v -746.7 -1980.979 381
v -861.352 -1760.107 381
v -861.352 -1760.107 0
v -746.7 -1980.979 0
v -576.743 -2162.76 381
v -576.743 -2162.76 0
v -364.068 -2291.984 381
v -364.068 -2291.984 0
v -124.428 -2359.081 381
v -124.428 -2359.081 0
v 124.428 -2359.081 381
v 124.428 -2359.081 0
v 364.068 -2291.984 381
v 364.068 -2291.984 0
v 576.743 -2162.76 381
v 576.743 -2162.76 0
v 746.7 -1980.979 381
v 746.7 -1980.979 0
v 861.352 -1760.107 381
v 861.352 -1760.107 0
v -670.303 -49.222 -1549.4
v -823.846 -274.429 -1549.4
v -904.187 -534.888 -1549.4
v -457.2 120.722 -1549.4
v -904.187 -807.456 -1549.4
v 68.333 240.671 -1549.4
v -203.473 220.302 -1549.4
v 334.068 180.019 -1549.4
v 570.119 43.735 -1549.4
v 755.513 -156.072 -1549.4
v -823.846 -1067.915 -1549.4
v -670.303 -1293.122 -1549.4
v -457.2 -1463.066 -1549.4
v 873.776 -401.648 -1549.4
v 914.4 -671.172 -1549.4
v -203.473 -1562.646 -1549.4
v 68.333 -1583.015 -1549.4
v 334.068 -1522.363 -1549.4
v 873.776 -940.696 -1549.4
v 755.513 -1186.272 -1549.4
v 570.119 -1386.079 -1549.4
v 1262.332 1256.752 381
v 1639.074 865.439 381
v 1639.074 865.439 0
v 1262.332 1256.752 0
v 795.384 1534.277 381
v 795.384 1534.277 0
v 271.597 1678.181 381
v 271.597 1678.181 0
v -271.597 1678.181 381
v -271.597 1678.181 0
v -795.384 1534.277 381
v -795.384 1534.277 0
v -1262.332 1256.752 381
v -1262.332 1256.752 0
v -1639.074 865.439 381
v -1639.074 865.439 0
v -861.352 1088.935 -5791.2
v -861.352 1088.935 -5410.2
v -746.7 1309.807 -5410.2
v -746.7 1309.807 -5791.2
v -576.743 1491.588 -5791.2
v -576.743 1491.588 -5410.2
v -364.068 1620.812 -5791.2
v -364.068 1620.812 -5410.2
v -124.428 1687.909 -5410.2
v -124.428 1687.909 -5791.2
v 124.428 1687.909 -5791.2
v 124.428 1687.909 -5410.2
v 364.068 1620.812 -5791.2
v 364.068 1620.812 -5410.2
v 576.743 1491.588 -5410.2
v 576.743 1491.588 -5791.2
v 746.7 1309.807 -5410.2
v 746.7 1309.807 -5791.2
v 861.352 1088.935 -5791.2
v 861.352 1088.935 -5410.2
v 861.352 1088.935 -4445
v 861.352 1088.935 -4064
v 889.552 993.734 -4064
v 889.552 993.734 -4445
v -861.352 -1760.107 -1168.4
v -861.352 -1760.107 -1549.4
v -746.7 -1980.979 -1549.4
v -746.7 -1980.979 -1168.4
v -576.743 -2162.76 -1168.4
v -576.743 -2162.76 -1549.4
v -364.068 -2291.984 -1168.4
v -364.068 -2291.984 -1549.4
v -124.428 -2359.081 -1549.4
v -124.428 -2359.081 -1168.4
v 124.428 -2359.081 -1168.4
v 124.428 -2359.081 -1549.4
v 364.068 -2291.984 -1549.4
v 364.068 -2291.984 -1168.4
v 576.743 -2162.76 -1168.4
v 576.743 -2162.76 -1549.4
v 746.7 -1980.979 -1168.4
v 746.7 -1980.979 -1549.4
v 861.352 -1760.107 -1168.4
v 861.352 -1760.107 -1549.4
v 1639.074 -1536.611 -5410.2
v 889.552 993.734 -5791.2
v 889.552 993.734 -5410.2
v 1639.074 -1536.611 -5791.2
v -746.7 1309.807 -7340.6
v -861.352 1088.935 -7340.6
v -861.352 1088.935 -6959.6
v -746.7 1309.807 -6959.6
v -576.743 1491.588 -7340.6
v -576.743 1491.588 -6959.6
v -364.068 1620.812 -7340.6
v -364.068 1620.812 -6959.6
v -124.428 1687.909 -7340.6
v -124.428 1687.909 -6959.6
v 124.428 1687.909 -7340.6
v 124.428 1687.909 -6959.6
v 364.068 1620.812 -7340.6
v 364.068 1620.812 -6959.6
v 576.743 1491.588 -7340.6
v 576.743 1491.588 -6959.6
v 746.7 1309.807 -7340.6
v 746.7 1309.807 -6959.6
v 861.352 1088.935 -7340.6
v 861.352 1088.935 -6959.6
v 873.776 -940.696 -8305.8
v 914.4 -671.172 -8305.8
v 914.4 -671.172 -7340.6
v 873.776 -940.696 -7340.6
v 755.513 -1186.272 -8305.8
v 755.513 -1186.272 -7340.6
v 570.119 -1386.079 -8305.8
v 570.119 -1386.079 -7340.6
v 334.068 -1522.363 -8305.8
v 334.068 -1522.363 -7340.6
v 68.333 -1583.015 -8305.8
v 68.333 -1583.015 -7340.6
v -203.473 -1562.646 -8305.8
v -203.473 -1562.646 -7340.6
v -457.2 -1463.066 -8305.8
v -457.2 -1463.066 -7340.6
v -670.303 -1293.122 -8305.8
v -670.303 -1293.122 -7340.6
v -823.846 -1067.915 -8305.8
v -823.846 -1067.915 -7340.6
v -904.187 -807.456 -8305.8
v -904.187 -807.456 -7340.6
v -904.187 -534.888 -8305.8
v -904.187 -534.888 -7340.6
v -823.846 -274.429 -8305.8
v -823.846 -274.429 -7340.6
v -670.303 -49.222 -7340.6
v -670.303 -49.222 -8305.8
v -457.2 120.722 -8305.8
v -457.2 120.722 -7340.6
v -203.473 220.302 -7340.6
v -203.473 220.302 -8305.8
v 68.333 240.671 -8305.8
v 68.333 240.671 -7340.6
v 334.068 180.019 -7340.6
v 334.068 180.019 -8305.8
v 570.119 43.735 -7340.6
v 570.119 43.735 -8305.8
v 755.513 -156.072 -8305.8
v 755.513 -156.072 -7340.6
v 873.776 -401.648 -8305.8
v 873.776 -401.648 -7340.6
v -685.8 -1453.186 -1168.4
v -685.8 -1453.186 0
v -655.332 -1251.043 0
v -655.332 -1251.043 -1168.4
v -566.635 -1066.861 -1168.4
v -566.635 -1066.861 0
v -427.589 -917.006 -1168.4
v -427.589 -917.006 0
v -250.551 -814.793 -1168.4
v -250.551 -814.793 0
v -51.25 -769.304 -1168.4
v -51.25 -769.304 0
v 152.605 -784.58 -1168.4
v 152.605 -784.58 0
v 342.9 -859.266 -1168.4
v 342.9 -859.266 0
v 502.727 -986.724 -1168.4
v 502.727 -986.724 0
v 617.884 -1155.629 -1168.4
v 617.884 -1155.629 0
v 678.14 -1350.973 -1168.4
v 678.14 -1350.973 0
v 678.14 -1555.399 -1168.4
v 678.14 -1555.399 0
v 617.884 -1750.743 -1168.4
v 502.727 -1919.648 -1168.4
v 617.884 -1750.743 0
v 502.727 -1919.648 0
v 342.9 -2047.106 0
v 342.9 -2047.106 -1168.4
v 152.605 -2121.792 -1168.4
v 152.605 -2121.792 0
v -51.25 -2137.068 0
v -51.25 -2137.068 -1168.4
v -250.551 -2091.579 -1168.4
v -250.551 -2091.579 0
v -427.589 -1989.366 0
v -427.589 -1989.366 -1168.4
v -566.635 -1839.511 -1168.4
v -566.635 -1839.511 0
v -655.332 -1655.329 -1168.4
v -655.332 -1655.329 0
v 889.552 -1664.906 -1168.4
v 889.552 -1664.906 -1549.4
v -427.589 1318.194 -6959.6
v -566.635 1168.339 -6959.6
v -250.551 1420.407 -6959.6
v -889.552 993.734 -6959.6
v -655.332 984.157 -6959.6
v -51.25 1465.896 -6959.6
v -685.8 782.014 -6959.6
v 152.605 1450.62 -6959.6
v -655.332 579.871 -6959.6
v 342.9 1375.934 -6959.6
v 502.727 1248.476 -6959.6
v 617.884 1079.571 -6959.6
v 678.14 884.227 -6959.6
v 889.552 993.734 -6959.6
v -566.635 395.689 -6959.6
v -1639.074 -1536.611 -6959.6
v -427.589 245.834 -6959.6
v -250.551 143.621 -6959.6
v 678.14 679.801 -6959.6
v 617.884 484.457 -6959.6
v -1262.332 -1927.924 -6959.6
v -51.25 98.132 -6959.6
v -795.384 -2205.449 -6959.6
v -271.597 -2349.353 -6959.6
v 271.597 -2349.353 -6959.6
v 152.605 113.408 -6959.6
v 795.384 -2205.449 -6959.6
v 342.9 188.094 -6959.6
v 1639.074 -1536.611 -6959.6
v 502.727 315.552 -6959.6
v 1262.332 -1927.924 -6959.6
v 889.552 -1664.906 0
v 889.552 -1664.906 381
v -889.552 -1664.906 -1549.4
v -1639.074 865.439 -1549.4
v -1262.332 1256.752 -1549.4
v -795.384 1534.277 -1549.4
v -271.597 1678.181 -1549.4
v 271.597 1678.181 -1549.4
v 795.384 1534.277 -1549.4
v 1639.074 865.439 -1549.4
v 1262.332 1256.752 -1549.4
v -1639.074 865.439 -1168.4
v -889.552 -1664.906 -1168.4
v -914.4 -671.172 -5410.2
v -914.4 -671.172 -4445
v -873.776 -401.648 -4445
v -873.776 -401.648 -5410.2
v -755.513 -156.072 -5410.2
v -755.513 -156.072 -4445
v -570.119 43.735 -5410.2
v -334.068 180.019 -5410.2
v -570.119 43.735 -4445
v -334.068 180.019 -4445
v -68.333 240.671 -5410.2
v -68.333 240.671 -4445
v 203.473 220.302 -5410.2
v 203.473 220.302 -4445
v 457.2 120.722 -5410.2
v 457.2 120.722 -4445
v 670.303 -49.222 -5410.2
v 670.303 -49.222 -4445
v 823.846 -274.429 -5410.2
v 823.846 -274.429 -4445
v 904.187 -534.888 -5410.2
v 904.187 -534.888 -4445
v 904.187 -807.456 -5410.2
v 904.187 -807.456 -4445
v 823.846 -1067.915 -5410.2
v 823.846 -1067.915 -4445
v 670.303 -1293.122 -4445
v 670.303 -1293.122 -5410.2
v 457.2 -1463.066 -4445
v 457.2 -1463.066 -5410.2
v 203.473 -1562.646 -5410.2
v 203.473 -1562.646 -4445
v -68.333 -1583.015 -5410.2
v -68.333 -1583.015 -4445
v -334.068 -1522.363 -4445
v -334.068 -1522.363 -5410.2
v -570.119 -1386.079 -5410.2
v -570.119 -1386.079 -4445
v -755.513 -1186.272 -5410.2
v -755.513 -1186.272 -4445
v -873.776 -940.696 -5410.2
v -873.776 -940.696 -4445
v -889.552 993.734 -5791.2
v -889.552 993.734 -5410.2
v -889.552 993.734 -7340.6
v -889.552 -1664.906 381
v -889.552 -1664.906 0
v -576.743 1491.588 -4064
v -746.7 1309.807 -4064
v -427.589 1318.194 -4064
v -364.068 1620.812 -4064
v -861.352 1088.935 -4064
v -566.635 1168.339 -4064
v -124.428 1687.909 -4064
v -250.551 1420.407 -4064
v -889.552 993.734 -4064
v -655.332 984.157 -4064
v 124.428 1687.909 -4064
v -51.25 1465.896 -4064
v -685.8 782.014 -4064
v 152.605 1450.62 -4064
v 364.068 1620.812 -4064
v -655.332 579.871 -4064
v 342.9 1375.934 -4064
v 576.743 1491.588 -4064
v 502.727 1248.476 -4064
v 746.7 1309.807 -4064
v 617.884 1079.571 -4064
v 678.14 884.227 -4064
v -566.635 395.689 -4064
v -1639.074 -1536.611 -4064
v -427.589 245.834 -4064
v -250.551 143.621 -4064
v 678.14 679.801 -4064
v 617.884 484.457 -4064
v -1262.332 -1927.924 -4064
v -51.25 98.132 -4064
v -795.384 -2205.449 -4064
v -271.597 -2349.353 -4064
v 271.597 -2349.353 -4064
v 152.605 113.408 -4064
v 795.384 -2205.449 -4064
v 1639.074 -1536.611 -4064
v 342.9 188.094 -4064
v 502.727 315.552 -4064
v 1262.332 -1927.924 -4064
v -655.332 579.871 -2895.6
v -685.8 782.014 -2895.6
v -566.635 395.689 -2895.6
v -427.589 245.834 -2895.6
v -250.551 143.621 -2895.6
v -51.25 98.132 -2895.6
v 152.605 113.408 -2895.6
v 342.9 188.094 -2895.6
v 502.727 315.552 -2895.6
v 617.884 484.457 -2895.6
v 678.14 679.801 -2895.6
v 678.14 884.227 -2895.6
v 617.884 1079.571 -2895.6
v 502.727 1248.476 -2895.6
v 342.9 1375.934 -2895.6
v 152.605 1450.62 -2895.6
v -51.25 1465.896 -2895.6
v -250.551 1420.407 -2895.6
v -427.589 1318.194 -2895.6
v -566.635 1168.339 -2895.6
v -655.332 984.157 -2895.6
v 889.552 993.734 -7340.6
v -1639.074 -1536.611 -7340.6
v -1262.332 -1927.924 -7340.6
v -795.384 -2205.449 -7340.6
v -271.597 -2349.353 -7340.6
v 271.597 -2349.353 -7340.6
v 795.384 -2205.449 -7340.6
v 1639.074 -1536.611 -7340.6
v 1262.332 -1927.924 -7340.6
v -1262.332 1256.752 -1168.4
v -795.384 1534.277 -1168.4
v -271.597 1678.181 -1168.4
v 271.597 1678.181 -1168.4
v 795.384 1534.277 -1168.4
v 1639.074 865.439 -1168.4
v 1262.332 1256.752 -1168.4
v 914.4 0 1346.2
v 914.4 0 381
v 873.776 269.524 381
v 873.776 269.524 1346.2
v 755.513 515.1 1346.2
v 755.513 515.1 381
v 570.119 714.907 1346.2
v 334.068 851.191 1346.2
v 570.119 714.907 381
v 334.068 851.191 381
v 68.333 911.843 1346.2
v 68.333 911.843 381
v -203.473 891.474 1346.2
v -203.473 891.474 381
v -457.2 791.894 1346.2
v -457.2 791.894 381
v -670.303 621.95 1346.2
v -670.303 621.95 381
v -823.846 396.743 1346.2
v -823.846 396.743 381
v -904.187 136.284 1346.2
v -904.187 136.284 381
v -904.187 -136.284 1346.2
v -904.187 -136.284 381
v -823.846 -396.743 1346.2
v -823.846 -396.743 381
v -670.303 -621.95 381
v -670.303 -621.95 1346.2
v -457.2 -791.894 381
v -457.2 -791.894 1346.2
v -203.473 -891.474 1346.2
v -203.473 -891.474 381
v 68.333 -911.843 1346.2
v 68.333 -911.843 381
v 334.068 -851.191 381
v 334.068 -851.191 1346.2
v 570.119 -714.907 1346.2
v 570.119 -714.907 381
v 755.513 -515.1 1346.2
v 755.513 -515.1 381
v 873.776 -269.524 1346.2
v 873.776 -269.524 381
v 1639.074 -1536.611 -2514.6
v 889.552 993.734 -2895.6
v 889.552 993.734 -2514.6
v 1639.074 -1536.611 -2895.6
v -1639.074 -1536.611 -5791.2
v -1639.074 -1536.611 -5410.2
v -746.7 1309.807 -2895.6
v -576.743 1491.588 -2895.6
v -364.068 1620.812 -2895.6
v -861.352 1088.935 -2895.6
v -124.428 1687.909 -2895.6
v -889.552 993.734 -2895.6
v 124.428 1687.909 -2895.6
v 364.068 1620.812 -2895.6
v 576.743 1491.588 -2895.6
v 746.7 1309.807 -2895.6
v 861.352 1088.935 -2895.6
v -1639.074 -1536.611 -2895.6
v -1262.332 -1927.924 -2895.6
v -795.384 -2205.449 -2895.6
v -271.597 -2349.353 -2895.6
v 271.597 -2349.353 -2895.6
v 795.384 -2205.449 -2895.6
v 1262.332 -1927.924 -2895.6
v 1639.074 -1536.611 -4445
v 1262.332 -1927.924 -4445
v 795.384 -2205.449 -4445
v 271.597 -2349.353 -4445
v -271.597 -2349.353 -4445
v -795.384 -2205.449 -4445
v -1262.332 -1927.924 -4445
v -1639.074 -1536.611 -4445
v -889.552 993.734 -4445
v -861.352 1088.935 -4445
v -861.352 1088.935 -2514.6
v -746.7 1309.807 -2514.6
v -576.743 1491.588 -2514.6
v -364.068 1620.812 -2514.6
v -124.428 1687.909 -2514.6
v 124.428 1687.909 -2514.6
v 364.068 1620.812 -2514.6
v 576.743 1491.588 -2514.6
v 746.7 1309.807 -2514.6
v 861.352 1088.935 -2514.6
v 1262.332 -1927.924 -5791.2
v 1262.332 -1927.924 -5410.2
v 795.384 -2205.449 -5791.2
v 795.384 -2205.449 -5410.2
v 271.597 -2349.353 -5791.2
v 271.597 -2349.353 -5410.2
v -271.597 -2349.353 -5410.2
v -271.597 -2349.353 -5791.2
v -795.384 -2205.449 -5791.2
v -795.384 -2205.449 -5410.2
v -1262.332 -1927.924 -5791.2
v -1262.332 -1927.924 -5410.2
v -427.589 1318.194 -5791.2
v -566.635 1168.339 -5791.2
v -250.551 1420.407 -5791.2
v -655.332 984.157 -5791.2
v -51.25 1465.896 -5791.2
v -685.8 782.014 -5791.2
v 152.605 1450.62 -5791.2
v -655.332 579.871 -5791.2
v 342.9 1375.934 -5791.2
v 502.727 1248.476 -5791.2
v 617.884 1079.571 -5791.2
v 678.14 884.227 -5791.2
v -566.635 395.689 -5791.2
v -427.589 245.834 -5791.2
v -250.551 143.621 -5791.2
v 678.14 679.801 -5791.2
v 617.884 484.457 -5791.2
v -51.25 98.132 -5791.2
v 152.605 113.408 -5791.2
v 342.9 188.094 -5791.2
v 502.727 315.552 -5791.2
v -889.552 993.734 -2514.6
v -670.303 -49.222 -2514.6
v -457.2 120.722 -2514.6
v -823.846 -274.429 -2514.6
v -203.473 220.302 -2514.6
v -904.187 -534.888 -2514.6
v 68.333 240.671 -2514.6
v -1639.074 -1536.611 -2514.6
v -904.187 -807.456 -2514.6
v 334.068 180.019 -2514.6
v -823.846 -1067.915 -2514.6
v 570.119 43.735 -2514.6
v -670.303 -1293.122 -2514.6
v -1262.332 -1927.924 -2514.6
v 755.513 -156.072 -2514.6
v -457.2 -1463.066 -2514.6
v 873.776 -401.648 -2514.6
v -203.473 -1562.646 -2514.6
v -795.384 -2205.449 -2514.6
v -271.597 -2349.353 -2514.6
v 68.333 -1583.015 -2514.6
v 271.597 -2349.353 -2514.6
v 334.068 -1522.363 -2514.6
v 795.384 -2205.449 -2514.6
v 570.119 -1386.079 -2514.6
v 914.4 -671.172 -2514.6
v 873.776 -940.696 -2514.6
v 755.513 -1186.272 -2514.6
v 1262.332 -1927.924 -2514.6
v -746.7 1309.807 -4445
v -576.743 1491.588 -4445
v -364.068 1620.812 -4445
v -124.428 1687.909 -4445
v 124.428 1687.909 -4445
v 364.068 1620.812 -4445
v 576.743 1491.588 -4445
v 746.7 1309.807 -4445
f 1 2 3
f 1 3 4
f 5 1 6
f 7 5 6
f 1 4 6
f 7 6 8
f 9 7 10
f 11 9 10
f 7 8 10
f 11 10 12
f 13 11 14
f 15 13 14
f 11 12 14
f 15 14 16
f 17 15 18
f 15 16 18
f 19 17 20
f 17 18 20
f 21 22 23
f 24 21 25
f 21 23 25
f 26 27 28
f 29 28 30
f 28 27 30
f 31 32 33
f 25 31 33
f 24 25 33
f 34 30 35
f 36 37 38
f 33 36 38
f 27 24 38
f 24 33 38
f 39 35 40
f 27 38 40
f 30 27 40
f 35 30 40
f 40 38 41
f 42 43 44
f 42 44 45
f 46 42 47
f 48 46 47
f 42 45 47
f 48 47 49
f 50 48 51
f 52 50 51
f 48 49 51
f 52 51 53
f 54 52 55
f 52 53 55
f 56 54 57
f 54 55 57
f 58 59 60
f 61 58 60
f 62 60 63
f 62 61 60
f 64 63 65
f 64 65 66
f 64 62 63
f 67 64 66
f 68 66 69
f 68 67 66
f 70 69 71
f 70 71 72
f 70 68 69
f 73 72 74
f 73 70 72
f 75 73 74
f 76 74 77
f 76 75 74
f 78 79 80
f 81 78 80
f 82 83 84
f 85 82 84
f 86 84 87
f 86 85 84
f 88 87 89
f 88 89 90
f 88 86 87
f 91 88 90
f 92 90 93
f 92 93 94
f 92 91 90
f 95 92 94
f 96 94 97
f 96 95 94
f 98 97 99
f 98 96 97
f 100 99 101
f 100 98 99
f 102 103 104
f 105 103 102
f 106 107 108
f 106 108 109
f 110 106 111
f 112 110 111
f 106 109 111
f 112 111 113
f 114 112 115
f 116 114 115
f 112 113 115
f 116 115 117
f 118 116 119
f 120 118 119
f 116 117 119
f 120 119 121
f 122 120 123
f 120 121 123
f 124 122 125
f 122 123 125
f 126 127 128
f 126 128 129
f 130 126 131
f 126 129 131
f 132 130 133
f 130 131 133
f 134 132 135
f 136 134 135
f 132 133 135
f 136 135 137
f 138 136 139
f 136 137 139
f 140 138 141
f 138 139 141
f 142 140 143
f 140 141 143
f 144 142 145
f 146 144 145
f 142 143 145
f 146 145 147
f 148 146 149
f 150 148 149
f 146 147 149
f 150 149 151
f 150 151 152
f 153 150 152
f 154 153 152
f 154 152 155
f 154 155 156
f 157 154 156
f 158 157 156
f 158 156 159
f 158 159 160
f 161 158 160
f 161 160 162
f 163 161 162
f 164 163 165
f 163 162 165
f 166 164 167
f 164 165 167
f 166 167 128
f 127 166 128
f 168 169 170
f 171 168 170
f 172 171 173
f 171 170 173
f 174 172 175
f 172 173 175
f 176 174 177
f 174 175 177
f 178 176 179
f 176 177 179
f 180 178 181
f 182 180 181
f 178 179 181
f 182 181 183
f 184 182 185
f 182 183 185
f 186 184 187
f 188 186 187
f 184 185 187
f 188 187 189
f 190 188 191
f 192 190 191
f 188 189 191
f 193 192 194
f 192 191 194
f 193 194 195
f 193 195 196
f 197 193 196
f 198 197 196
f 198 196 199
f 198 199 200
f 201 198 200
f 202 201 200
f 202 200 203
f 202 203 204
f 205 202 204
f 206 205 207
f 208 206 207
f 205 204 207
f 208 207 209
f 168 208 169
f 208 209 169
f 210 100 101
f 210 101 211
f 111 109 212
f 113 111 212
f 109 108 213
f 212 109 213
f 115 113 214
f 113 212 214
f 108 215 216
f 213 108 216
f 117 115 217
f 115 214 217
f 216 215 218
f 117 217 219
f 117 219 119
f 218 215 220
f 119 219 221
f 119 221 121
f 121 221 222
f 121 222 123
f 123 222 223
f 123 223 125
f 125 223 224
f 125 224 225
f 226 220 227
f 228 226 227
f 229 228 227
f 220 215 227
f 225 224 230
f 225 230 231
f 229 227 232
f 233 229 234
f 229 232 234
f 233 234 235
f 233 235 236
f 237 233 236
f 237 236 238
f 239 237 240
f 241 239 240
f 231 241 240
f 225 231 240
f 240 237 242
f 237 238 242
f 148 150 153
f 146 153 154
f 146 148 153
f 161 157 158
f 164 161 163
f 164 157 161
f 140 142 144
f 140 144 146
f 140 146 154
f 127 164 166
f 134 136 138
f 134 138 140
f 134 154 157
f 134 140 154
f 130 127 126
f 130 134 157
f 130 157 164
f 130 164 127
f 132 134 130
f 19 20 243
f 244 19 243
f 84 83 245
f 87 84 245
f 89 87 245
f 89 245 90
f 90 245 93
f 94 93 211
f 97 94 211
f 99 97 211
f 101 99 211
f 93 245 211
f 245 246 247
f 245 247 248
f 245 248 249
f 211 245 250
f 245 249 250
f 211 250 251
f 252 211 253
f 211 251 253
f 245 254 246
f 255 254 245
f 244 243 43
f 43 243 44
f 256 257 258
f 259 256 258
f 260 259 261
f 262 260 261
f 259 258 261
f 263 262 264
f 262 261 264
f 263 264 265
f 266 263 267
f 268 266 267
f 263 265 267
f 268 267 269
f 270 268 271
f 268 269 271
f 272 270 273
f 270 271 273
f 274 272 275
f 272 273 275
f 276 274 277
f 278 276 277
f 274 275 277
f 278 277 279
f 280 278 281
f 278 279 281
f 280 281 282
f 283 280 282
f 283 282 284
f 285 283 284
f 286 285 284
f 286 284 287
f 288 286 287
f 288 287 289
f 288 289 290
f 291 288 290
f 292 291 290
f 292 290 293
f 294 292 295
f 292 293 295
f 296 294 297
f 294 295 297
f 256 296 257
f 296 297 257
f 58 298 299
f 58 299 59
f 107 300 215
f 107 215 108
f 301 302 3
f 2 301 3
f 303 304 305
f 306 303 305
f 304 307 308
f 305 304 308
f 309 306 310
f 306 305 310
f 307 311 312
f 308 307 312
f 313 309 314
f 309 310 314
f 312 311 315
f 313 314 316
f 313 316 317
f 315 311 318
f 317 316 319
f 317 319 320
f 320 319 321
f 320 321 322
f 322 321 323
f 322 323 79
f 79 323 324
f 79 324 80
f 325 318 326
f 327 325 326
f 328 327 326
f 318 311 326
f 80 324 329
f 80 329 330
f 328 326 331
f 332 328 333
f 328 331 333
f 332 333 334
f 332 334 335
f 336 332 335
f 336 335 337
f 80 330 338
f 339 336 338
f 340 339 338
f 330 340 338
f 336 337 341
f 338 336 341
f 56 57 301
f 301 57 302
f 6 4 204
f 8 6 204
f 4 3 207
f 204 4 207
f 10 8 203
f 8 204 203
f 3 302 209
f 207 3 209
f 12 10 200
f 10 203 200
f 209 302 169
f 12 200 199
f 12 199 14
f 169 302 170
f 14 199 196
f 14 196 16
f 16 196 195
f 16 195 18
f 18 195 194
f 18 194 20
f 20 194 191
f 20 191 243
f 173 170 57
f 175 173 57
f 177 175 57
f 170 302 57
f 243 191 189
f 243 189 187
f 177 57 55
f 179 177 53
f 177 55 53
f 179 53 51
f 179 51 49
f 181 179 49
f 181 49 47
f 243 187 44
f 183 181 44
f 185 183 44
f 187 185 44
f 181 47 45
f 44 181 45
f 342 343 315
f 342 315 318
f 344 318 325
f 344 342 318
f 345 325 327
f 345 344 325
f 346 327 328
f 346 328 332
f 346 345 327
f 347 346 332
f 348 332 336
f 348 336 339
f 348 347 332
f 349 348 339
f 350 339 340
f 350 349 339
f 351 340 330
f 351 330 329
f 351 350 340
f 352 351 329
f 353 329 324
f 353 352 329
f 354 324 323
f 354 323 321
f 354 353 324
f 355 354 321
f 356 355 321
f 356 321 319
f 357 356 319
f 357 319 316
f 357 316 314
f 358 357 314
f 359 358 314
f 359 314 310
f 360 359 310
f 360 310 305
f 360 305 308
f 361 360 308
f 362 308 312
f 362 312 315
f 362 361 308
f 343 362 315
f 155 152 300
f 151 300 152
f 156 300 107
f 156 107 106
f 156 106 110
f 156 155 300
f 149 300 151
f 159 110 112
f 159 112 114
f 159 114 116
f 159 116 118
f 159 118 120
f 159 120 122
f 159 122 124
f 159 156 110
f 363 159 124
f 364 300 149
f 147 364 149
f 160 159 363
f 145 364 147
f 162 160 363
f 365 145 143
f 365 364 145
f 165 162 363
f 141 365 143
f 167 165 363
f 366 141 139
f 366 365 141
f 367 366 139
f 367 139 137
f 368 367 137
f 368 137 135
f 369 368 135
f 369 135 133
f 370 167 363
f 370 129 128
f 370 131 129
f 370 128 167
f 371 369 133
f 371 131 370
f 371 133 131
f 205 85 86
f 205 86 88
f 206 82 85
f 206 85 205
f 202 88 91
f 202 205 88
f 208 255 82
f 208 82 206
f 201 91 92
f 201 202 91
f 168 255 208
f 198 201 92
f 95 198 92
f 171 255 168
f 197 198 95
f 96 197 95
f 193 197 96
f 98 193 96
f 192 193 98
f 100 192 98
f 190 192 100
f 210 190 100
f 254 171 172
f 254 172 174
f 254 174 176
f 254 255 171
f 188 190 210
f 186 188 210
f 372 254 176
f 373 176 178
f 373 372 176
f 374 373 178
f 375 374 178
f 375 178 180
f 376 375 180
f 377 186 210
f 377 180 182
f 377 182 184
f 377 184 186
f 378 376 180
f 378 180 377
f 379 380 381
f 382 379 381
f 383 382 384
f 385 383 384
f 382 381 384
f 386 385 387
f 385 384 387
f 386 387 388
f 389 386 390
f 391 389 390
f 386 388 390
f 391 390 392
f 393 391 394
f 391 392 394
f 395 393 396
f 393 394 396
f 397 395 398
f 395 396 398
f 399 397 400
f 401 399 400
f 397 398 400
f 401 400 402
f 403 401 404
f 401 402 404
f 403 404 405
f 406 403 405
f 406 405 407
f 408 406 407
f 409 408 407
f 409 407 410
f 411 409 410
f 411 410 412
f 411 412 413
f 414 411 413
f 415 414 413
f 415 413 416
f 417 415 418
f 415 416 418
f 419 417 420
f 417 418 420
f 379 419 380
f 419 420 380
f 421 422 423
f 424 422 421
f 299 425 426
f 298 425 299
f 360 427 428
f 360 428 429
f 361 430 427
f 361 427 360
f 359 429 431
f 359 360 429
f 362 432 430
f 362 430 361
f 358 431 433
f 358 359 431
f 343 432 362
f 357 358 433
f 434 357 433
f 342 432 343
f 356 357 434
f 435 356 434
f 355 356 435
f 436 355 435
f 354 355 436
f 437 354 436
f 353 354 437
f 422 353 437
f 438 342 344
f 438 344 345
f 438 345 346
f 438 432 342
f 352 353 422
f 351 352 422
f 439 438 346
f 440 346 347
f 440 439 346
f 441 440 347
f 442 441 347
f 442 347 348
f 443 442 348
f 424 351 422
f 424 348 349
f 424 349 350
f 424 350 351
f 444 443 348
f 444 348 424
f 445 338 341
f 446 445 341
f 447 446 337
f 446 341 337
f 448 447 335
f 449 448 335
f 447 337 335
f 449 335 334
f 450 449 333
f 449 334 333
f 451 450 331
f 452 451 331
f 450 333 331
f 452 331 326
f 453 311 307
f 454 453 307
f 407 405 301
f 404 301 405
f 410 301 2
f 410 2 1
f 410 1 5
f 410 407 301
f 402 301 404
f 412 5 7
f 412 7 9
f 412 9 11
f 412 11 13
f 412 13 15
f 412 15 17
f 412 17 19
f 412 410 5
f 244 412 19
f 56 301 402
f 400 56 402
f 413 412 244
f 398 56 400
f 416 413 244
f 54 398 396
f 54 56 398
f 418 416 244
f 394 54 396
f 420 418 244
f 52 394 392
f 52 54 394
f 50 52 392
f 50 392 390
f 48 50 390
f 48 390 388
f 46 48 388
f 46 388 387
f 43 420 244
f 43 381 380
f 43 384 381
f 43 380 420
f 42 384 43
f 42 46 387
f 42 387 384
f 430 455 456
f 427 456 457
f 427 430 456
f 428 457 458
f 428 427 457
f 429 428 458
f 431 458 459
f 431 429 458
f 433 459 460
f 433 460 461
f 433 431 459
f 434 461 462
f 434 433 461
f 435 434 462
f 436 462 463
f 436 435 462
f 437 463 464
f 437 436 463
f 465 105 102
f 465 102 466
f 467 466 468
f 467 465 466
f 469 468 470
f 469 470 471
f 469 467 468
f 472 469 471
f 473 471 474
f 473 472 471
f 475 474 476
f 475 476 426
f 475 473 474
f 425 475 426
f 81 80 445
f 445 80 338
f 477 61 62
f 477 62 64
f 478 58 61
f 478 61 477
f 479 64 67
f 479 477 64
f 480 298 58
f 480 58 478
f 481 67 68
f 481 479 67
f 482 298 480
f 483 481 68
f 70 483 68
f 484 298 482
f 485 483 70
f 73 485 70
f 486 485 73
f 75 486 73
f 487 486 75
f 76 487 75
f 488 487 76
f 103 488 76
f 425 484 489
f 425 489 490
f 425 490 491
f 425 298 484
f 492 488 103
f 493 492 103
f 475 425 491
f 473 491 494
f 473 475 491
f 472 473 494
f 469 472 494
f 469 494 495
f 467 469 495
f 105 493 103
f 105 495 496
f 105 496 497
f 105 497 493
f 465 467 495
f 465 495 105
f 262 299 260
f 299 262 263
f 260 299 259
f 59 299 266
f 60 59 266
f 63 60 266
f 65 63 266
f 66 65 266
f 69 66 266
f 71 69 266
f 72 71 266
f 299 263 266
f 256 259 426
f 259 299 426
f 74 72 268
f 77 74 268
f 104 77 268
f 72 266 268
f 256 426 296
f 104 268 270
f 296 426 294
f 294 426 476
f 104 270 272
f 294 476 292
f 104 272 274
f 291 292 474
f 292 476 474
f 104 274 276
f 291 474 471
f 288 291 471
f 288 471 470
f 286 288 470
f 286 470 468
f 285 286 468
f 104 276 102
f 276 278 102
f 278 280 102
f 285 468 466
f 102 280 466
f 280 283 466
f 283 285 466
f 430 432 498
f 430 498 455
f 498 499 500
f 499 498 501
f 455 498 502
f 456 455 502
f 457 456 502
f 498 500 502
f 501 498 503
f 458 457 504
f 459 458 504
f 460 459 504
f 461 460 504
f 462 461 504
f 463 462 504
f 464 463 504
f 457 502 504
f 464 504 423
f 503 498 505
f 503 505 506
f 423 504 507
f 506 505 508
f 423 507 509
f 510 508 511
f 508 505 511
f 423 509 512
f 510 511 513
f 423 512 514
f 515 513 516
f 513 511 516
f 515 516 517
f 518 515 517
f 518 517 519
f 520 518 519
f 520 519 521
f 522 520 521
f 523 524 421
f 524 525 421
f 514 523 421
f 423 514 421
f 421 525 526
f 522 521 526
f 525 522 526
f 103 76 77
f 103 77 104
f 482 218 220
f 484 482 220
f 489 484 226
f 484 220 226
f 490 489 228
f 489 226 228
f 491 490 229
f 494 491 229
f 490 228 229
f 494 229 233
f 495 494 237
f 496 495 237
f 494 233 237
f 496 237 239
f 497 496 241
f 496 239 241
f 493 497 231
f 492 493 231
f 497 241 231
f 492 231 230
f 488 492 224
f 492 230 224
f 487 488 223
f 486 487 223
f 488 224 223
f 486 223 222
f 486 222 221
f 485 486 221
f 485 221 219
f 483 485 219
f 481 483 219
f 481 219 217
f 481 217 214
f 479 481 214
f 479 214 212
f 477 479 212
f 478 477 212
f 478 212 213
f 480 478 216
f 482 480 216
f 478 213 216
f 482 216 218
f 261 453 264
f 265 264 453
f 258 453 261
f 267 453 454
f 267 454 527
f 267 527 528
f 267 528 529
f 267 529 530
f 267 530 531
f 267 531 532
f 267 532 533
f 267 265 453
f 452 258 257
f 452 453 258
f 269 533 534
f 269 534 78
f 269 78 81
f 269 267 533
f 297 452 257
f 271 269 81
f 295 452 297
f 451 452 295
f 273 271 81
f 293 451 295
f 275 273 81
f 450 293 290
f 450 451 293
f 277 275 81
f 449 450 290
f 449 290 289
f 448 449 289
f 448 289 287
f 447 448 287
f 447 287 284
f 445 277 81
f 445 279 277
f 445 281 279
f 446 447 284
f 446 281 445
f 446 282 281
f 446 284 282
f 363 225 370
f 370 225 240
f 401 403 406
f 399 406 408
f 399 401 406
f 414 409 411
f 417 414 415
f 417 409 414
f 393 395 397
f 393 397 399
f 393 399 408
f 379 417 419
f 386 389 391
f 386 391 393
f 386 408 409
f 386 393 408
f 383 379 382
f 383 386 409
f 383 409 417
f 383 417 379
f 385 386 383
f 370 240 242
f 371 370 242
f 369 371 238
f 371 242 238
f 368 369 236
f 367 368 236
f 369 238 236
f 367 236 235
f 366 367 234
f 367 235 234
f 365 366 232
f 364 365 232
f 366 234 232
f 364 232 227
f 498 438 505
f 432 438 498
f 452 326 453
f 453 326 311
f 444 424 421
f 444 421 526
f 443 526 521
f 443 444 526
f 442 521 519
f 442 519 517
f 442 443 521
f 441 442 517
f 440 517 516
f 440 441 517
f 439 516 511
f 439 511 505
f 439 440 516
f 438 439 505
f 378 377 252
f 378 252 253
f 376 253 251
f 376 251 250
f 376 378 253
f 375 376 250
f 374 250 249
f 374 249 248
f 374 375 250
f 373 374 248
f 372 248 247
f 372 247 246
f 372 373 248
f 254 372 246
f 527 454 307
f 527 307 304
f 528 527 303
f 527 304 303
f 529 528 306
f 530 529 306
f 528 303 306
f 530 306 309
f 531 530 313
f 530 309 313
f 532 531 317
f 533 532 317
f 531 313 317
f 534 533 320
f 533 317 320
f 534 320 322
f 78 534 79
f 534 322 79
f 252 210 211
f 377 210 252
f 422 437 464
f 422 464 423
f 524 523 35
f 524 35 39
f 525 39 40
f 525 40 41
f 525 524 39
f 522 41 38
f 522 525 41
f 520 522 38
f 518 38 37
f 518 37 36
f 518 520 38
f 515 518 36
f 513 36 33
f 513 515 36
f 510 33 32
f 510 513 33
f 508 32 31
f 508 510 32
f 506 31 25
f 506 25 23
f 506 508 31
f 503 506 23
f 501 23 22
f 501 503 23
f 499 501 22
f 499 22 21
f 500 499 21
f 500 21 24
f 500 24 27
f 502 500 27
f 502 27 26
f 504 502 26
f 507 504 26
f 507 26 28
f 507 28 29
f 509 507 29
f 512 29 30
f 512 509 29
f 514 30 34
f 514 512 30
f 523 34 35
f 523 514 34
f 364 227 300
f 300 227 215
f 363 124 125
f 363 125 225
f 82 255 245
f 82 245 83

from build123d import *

# Parameters (mm, degrees)
BOSS_EXTRUDE1_DEPTH   = 381
SKETCH3_R             = 685.8
BOSS_EXTRUDE2_DEPTH   = 1168.4
SKETCH4_R             = 914.4
BOSS_EXTRUDE5_DEPTH   = 965.2
BODY_MOVE_COPY6_ANGLE = 180
SKETCH7_R             = 914.4
BOSS_EXTRUDE7_DEPTH   = 965.2


with BuildPart() as part:
    # Sketch2 → Boss-Extrude1 (new body)
    with BuildSketch(Plane.XY):
        with BuildLine():
            ThreePointArc((1639.073881445, 865.438888575), (0, 1696.413988265), (-1639.073881445, 865.438888575))
            Line((-1639.073881445, 865.438888575), (-889.551566195, -1664.906041679))
            ThreePointArc((-889.551566195, -1664.906041679), (-106.586602983, -545.019366199), (914.4, -1453.186011735))
            ThreePointArc((914.4, -1453.186011735), (908.166645536, -1559.772614718), (889.551566195, -1664.906041679))
            Line((889.551566195, -1664.906041679), (1639.073881445, 865.438888575))
        make_face()
        with BuildLine():
            ThreePointArc((914.4, -1453.186011735), (-106.586602983, -545.019366199), (-889.551566195, -1664.906041679))
            Line((-889.551566195, -1664.906041679), (-861.35171004, -1760.107160586))
            ThreePointArc((-861.35171004, -1760.107160586), (0, -2367.586011735), (861.35171004, -1760.107160586))
            Line((861.35171004, -1760.107160586), (889.551566195, -1664.906041679))
            ThreePointArc((889.551566195, -1664.906041679), (908.166645536, -1559.772614718), (914.4, -1453.186011735))
        make_face()
    extrude(amount=BOSS_EXTRUDE1_DEPTH)

    # Sketch3 → Boss-Extrude2 (add)
    with BuildSketch(Plane(origin=(0, 0, 0), x_dir=(-1, 0, 0), z_dir=(0, 0, -1))):
        with Locations((0, -1453.186011735)):
            Circle(SKETCH3_R)
    extrude(amount=BOSS_EXTRUDE2_DEPTH)

    # Mirror9: part across plane


with BuildPart() as part_1:
    add(part.part)
    add(part.part.mirror(Plane(origin=(0, 0, -584.2), x_dir=(1, 0, 0), z_dir=(0, 0, -1))))

    # Sketch4 → Boss-Extrude5 (add)
    with BuildSketch(Plane.XY.offset(381)):
        Circle(SKETCH4_R)
    extrude(amount=BOSS_EXTRUDE5_DEPTH)


with BuildPart() as body_2:
    # Mirror14: mirrored copy
    add(part_1.part.mirror(Plane(origin=(0, 0, -2032), x_dir=(1, 0, 0), z_dir=(0, 0, -1))))


with BuildPart() as body_2_1:
    # Body-Move/Copy6: moved
    add(body_2.part.rotate(Axis((0, -335.586011735, -3962.4), (1, 0, 0)), BODY_MOVE_COPY6_ANGLE))


with BuildPart() as body_2_2:
    # Body-Move/Copy7: moved
    add(body_2_1.part.moved(Location((0, 0, 965.2))))


with BuildPart() as body_3:
    # Mirror16: mirrored copy
    add(body_2_2.part.mirror(Plane(origin=(0, 0, -4927.6), x_dir=(1, 0, 0), z_dir=(0, 0, -1))))


with BuildPart() as body_2_3:
    add(body_2_2.part)

    add(body_3.part)  # Boss-Extrude7 merges body 3
    # Sketch7 → Boss-Extrude7 (add)
    with BuildSketch(Plane(origin=(0, 0, -4445), x_dir=(-1, 0, 0), z_dir=(0, 0, -1))):
        with Locations((0, -671.17202347)):
            Circle(SKETCH7_R)
    extrude(amount=BOSS_EXTRUDE7_DEPTH)


solid = Compound([part_1.part, body_2_3.part])
